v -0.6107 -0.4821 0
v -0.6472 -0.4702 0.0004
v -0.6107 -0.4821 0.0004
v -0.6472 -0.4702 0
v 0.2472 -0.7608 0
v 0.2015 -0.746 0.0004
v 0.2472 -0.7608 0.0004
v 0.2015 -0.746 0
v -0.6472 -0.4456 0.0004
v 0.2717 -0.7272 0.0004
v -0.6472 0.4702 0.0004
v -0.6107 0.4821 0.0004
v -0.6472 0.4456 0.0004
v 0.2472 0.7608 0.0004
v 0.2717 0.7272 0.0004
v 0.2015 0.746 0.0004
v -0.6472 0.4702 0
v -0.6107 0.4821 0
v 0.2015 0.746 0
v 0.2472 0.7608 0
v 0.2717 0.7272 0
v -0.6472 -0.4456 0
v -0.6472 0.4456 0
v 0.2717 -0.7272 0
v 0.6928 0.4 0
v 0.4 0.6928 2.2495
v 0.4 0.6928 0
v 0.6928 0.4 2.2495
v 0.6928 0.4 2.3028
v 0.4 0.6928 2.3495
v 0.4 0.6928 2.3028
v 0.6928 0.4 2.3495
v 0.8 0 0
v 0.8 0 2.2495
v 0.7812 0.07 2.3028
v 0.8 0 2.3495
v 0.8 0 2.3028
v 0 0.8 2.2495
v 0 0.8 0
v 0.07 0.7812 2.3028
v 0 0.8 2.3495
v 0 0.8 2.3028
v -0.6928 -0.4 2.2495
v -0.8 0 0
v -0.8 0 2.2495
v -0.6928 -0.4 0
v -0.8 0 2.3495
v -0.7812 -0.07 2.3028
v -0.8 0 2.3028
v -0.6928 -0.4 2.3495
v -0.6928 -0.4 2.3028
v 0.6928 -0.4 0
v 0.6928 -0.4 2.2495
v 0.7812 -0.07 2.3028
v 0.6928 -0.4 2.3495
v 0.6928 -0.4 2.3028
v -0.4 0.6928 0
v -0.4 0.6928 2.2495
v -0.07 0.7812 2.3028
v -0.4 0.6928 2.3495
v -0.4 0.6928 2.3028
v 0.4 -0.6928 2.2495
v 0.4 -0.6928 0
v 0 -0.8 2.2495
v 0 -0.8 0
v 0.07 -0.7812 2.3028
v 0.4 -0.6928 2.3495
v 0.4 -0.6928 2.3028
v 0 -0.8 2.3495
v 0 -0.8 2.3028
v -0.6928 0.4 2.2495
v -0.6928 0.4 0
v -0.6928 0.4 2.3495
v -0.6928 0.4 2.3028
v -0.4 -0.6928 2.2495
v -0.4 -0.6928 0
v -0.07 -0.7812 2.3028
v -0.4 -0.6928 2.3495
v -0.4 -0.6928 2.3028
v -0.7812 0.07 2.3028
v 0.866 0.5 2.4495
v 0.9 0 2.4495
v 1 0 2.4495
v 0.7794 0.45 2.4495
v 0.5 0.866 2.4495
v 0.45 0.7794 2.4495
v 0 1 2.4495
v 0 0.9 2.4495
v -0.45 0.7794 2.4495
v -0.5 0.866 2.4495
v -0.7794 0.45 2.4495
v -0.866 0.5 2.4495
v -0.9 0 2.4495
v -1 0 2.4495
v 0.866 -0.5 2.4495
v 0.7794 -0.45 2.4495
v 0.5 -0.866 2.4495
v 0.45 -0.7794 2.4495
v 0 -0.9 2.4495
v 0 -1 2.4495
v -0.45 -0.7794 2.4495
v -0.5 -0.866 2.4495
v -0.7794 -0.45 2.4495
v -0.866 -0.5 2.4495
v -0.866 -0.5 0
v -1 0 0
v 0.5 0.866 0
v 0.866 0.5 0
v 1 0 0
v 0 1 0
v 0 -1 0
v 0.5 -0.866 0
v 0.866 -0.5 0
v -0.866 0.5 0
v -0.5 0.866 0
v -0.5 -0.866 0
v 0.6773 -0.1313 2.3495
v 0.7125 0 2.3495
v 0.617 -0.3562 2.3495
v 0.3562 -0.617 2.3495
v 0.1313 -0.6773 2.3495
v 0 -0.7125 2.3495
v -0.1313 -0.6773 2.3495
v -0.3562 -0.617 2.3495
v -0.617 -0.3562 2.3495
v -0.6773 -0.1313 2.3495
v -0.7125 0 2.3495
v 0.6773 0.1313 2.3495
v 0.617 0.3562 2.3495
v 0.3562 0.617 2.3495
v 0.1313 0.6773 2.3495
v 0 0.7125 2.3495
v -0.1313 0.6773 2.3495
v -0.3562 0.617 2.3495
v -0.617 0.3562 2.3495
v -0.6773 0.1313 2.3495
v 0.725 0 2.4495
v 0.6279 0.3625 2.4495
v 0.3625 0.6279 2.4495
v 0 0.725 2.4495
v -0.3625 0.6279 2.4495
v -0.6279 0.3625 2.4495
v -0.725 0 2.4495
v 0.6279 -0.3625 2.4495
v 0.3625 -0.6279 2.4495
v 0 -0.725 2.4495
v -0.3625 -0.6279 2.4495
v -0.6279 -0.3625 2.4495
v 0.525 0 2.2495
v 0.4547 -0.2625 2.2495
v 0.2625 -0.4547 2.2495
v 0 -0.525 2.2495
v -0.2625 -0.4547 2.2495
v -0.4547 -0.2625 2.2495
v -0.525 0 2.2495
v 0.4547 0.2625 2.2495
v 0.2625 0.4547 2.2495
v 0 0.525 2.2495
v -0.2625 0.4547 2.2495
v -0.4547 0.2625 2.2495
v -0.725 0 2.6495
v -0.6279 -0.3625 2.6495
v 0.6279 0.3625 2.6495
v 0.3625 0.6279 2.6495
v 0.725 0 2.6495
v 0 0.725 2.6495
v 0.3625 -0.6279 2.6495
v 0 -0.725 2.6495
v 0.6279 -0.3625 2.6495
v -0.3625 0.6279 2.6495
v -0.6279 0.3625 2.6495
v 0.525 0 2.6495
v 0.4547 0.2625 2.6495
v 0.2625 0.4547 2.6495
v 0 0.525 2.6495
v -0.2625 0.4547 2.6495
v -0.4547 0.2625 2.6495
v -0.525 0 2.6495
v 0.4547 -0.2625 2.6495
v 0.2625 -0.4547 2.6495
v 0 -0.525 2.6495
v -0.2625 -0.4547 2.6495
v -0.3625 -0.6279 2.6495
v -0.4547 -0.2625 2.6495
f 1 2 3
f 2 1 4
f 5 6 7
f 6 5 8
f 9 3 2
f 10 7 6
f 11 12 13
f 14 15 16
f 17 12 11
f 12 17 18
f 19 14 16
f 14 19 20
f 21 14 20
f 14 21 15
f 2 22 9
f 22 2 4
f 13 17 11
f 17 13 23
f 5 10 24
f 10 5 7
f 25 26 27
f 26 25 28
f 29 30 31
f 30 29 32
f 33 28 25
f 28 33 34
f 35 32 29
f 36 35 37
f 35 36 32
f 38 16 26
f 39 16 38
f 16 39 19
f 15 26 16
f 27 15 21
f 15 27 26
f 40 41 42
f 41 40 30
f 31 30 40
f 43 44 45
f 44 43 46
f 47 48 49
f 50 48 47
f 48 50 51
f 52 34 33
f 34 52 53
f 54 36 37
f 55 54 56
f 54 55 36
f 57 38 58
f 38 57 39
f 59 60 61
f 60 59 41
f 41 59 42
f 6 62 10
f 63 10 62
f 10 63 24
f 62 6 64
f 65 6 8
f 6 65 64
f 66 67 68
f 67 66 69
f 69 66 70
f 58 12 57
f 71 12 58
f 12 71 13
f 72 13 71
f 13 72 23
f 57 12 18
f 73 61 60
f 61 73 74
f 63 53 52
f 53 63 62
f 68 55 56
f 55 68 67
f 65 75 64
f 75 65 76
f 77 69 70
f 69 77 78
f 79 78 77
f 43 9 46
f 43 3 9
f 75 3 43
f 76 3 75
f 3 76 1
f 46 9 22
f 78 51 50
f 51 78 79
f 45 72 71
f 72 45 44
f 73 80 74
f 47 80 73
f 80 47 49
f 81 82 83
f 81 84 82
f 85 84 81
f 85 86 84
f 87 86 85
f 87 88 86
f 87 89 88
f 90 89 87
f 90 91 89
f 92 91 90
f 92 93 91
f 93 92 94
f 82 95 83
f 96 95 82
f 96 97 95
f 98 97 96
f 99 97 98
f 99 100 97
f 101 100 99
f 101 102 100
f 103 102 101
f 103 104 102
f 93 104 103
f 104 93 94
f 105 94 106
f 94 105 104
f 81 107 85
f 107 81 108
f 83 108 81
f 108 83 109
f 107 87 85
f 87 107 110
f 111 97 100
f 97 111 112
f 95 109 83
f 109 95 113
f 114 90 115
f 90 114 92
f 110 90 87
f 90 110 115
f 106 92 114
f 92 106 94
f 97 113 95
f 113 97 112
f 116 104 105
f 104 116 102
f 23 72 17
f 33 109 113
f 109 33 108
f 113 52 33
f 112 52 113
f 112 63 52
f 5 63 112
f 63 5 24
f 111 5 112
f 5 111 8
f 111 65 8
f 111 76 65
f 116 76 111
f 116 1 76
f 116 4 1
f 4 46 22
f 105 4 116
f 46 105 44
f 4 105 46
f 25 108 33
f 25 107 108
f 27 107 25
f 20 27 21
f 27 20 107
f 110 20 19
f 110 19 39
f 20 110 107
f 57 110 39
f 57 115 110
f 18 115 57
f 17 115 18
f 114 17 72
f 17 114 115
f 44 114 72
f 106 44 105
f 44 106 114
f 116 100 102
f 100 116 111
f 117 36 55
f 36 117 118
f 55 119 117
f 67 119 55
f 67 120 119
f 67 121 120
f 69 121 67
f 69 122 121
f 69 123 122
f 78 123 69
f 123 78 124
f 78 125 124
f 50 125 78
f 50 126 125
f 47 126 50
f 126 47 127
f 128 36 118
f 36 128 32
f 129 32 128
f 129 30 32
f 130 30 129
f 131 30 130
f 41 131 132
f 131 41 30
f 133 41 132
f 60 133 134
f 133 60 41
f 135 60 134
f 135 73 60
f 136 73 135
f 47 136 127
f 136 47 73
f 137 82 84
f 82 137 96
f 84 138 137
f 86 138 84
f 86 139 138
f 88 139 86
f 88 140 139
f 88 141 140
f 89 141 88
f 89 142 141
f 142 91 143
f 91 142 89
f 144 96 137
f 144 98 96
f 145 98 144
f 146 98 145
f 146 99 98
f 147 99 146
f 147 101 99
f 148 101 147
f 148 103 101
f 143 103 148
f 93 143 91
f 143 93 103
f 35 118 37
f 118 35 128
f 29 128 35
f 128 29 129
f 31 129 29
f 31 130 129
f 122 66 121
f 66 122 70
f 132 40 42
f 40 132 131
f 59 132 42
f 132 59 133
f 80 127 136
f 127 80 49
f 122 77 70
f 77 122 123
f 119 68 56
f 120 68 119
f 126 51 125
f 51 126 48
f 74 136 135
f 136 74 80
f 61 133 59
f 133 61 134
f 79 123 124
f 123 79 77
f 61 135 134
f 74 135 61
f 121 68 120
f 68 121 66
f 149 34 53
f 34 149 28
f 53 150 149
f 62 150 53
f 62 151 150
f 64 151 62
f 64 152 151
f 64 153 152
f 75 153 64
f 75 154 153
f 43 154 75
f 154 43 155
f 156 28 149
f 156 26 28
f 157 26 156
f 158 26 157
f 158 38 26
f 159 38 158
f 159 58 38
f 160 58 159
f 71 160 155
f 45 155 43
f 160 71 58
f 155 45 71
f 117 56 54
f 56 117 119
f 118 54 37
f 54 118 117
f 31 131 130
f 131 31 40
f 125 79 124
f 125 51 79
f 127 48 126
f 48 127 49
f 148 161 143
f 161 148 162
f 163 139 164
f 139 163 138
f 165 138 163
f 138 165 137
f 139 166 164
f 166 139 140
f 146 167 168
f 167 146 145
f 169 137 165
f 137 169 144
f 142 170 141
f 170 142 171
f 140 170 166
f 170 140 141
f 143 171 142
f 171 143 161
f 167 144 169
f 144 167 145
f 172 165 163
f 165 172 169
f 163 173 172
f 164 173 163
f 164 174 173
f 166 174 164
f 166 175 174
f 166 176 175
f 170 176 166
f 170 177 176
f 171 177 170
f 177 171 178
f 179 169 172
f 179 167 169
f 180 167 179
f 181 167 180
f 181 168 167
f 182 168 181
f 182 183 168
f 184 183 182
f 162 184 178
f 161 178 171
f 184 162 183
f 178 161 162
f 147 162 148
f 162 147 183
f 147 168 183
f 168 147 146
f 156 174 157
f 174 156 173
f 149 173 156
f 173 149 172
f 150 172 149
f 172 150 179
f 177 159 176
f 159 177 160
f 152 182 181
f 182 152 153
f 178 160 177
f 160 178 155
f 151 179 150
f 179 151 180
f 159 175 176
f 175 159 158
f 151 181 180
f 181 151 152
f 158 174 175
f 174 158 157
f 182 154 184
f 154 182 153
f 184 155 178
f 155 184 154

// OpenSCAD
tolerance=0.075;
hole_radius=0.05;
grid_hole_radius=0.05;
outer_radius=1;
thickness=0.2;
hole_attach_height=0.05;
attach_thickness=0.1;

//parameters that don't have to be defined explicitly
eps = tolerance/100;
inner_radius = outer_radius - thickness;
fn = 12;
fnh = 6;

module angled_cylinder(angle_deg_y, _h, _r, angle_deg_x = 0) {
    rotate([angle_deg_x, angle_deg_y, 0]) { // Rotate the cylinder 
            cylinder(h = _h, r = _r, center = true, $fn = fnh);
        }
}

module hole(_h) {
    cylinder(h = _h, r = grid_hole_radius, $fn = fnh);
}

//makes circle of holes
module circular_grid(_h, _r, _n) {
    for (i = [0:_n-1]) {
        angle = i * 360 / _n;
        x_pos = _r * cos(angle);
        y_pos = _r * sin(angle);
        translate([x_pos, y_pos, -eps]) {
            hole(_h);
        }
    }
}

//makes grid of holes
module hole_grid(hole_height, grid_h) {
    translate([0,0,hole_height]) {
        difference() {
            //cylinder
            cylinder(h = grid_h, r = (inner_radius + outer_radius)/2, 
                center=false, $fn = fn);
            //holes
            for (i = [0 : grid_hole_radius * 2 + hole_attach_height : inner_radius - grid_hole_radius * 2]) {
                circular_grid(grid_h + eps*2, i, ceil(6.28*i/(grid_hole_radius*4)));
            }
            
        } 
    }
}

//makes curve of CSC
module curve(_radius, _twist, _turning_angle, _turning_radius) {
    rotate([90,0,_twist])
    translate([-_turning_radius, 0, 0])
    rotate_extrude(angle=_turning_angle, convexity=100, $fn = fn)
    translate([_turning_radius, 0]) circle(_radius);
}

module CSC(_r, _t1, _ta1, _tr1, _h, _t2, _ta2, _tr2, is_inner) {
    
    if (_ta1 > 90) {
        CSC(_r, _t1, 90, _tr1, 0, 0, 0, 0, is_inner);
        
        pos1 = (-_tr1 + sqrt(_tr1*_tr1 - pow(_tr1,2)));
        translate([pos1*cos(_t1),pos1*sin(_t1),_tr1])
        rotate([0,-90,_t1])
        CSC(_r, 0, _ta1 - 90, _tr1, _h, _t2, _ta2, _tr2, is_inner);
    } else if (_ta2 > 90) {
        CSC(_r, _t1, _ta1, _tr1, _h, _t2, 90, _tr2, is_inner);
        
        pos1 = (-_tr1 + sqrt(_tr1*_tr1 - pow(_tr1*sin(_ta1),2)));
        pos2 = (-_tr2 + sqrt(_tr2*_tr2 - pow(_tr2,2)));
        translate([pos1*cos(_t1),pos1*sin(_t1),_tr1*sin(_ta1)])
        rotate([0,-_ta1,_t1])
        translate([0, 0, _h])
        translate([pos2*cos(_t2),pos2*sin(_t2),_tr2])
        rotate([0,-90,_t2])
        CSC(_r, 0, 0, 0, 0, 0, _ta2 - 90, _tr2, is_inner);
    } else {
        //intermediate positions
        pos1 = (-_tr1 + sqrt(_tr1*_tr1 - pow(_tr1*sin(_ta1),2)));
        pos2 = (-_tr2 + sqrt(_tr2*_tr2 - pow(_tr2*sin(_ta2),2)));
        
        union() {
            //bottom shell threshold
            if (is_inner) {
                cylinder(h=eps, r=_r, center=true);
            }
            
            //first curve of CSC
            curve(_r, _t1, _ta1, _tr1);
            
            //straight link of CSC
            translate([pos1*cos(_t1),pos1*sin(_t1),_tr1*sin(_ta1)])
            rotate([0,-_ta1,_t1])
            if (is_inner) {
                //add threshold for shelling
                translate([0,0,-eps /2])
                cylinder(h=_h + eps,r=_r, center = false, $fn= fn);
            } else {
                cylinder(h=_h,r=_r, center = false, $fn= fn);
            }
            
            //second curve of CSC
            translate([pos1*cos(_t1),pos1*sin(_t1),_tr1*sin(_ta1)])
            rotate([0,-_ta1,_t1])
            translate([0, 0, _h])
            curve(_r, _t2, _ta2, _tr2);
            
            //shelling thresholds
            if (is_inner) {
                translate([pos1*cos(_t1),pos1*sin(_t1),_tr1*sin(_ta1)])
                rotate([0,-_ta1,_t1])
                translate([0, 0, _h])
                translate([pos2*cos(_t2),pos2*sin(_t2),_tr2*sin(_ta2)])
                rotate([0,-_ta2,_t2]) {
                    cylinder(h=eps, r=_r, center=true,$fn=fn);
                }
            
            }
        }
    }
    
}

//allow modules to attach
module CSC_ATTACH(_r, _t1, _ta1, _tr1, _h, _t2, _ta2, _tr2, next_hole_radius, next_hole_attach_height, next_inner) {
    
    if (_ta1 > 90) {        
        pos1 = (-_tr1 + sqrt(_tr1*_tr1 - pow(_tr1,2)));
        translate([pos1*cos(_t1),pos1*sin(_t1),_tr1])
        rotate([0,-90,_t1])
        CSC_ATTACH(_r, 0, _ta1 - 90, _tr1, _h, _t2, _ta2, _tr2, next_hole_radius, next_hole_attach_height, next_inner);
    } else if (_ta2 > 90) {        
        pos1 = (-_tr1 + sqrt(_tr1*_tr1 - pow(_tr1*sin(_ta1),2)));
        pos2 = (-_tr2 + sqrt(_tr2*_tr2 - pow(_tr2,2)));
        translate([pos1*cos(_t1),pos1*sin(_t1),_tr1*sin(_ta1)])
        rotate([0,-_ta1,_t1])
        translate([0, 0, _h])
        translate([pos2*cos(_t2),pos2*sin(_t2),_tr2])
        rotate([0,-90,_t2])
        CSC_ATTACH(_r, 0, 0, 0, 0, 0, _ta2 - 90, _tr2, next_hole_radius, next_hole_attach_height, next_inner);
    } else {
        //intermediate positions
        pos1 = (-_tr1 + sqrt(_tr1*_tr1 - pow(_tr1*sin(_ta1),2)));
        pos2 = (-_tr2 + sqrt(_tr2*_tr2 - pow(_tr2*sin(_ta2),2)));
        
        translate([pos1*cos(_t1),pos1*sin(_t1),_tr1*sin(_ta1)])
        rotate([0,-_ta1,_t1])
        translate([0, 0, _h])
        translate([pos2*cos(_t2),pos2*sin(_t2),_tr2*sin(_ta2)])
        rotate([0,-_ta2,_t2]) {
            difference() {
                union() {
                    //attachment for smaller cylinder
                    translate([0,0,-attach_thickness])
                    cylinder(h=attach_thickness, r=_r - thickness/2, $fn=fn);
                    translate([0,0,-attach_thickness*2])
                    cylinder(h=attach_thickness*2, r1=_r - thickness/2, r2=next_inner - tolerance - thickness, $fn=fn);
                    
                    //small cylinder
                    cylinder(h=next_hole_radius*2 + next_hole_attach_height * 2, r = next_inner - tolerance, $fn=fn);
                }
                
                //shelling
                translate([0,0, -attach_thickness*2 - eps/2])
                cylinder(h=next_hole_radius*2 + next_hole_attach_height * 2 + attach_thickness*2 + eps, r = min(inner_radius, next_inner - tolerance - thickness), $fn=fn);
                
                //holes for screws
    //            translate([0,0,next_hole_attach_height + next_hole_radius]) {
    //                angled_cylinder(0, (next_inner + thickness + eps) * 2,  hole_radius, 90);
    //                angled_cylinder(90, (next_inner + thickness + eps) * 2, hole_radius, 0);
    //            }
            }
        }
    }
}

//remove overlap to allow all branches to attach to each other
module CSC_REMOVE_OVERLAP(_r, _t1, _ta1, _tr1, _h, _t2, _ta2, _tr2, next_hole_radius, next_hole_attach_height, next_inner) {
    if (_ta1 > 90) {        
        pos1 = (-_tr1 + sqrt(_tr1*_tr1 - pow(_tr1,2)));
        translate([pos1*cos(_t1),pos1*sin(_t1),_tr1])
        rotate([0,-90,_t1])
        CSC_REMOVE_OVERLAP(_r, 0, _ta1 - 90, _tr1, _h, _t2, _ta2, _tr2, next_hole_radius, next_hole_attach_height, next_inner);
    } else if (_ta2 > 90) {        
        pos1 = (-_tr1 + sqrt(_tr1*_tr1 - pow(_tr1*sin(_ta1),2)));
        pos2 = (-_tr2 + sqrt(_tr2*_tr2 - pow(_tr2,2)));
        translate([pos1*cos(_t1),pos1*sin(_t1),_tr1*sin(_ta1)])
        rotate([0,-_ta1,_t1])
        translate([0, 0, _h])
        translate([pos2*cos(_t2),pos2*sin(_t2),_tr2])
        rotate([0,-90,_t2])
        CSC_REMOVE_OVERLAP(_r, 0, 0, 0, 0, 0, _ta2 - 90, _tr2, next_hole_radius, next_hole_attach_height, next_inner);
    } else {
        pos1 = (-_tr1 + sqrt(_tr1*_tr1 - pow(_tr1*sin(_ta1),2)));
        pos2 = (-_tr2 + sqrt(_tr2*_tr2 - pow(_tr2*sin(_ta2),2)));
        
        translate([pos1*cos(_t1),pos1*sin(_t1),_tr1*sin(_ta1)])
        rotate([0,-_ta1,_t1])
        translate([0, 0, _h])
        translate([pos2*cos(_t2),pos2*sin(_t2),_tr2*sin(_ta2)])
        rotate([0,-_ta2,_t2]) {
            cylinder(h=999999, r=_r + tolerance, $fn=fn);
        }
    }
}

//c is _t1, _ta1, _tr1, _h, _t2, _ta2, _tr2, next hole radius, next hole height, next inner radius
module branch(branch_list, _outer, _inner) {
    union() {
        //make grid of holes
        //hole_grid(hole_radius*2 + hole_attach_height * 2, grid_hole_radius);
        
        //make CSC shells for each CSC in branch_list
        difference() {
            for (c = branch_list) {
                CSC(_outer,c[0],c[1],c[2],c[3],c[4],c[5],c[6], false);
            }
            
            for (c = branch_list) {
                CSC(_inner,c[0],c[1],c[2],c[3],c[4],c[5],c[6], true);
                CSC_REMOVE_OVERLAP(_outer,c[0],c[1],c[2],c[3],c[4],c[5],c[6],c[7], c[8], c[9]);
            }
            
            //make screw holes at the bottom
//            translate([0,0,hole_radius + hole_attach_height]) {
//                angled_cylinder(0, (outer_radius*1.5 + eps) * 2,  hole_radius, 90);
//                angled_cylinder(90, (outer_radius*1.5 + eps) * 2, hole_radius, 0);
//            }    
        }
        for (c=branch_list) {     
            CSC_ATTACH(_outer,c[0],c[1],c[2],c[3],c[4],c[5],c[6], c[7], c[8], c[9]);
        }
    }
}

branch([
[ 0.0, 0.0, 1.0*outer_radius, 2.4495*outer_radius, 0.0, 0.0, 1.0*outer_radius, 0.05, 0.05, 0.8],
],outer_radius,inner_radius);
